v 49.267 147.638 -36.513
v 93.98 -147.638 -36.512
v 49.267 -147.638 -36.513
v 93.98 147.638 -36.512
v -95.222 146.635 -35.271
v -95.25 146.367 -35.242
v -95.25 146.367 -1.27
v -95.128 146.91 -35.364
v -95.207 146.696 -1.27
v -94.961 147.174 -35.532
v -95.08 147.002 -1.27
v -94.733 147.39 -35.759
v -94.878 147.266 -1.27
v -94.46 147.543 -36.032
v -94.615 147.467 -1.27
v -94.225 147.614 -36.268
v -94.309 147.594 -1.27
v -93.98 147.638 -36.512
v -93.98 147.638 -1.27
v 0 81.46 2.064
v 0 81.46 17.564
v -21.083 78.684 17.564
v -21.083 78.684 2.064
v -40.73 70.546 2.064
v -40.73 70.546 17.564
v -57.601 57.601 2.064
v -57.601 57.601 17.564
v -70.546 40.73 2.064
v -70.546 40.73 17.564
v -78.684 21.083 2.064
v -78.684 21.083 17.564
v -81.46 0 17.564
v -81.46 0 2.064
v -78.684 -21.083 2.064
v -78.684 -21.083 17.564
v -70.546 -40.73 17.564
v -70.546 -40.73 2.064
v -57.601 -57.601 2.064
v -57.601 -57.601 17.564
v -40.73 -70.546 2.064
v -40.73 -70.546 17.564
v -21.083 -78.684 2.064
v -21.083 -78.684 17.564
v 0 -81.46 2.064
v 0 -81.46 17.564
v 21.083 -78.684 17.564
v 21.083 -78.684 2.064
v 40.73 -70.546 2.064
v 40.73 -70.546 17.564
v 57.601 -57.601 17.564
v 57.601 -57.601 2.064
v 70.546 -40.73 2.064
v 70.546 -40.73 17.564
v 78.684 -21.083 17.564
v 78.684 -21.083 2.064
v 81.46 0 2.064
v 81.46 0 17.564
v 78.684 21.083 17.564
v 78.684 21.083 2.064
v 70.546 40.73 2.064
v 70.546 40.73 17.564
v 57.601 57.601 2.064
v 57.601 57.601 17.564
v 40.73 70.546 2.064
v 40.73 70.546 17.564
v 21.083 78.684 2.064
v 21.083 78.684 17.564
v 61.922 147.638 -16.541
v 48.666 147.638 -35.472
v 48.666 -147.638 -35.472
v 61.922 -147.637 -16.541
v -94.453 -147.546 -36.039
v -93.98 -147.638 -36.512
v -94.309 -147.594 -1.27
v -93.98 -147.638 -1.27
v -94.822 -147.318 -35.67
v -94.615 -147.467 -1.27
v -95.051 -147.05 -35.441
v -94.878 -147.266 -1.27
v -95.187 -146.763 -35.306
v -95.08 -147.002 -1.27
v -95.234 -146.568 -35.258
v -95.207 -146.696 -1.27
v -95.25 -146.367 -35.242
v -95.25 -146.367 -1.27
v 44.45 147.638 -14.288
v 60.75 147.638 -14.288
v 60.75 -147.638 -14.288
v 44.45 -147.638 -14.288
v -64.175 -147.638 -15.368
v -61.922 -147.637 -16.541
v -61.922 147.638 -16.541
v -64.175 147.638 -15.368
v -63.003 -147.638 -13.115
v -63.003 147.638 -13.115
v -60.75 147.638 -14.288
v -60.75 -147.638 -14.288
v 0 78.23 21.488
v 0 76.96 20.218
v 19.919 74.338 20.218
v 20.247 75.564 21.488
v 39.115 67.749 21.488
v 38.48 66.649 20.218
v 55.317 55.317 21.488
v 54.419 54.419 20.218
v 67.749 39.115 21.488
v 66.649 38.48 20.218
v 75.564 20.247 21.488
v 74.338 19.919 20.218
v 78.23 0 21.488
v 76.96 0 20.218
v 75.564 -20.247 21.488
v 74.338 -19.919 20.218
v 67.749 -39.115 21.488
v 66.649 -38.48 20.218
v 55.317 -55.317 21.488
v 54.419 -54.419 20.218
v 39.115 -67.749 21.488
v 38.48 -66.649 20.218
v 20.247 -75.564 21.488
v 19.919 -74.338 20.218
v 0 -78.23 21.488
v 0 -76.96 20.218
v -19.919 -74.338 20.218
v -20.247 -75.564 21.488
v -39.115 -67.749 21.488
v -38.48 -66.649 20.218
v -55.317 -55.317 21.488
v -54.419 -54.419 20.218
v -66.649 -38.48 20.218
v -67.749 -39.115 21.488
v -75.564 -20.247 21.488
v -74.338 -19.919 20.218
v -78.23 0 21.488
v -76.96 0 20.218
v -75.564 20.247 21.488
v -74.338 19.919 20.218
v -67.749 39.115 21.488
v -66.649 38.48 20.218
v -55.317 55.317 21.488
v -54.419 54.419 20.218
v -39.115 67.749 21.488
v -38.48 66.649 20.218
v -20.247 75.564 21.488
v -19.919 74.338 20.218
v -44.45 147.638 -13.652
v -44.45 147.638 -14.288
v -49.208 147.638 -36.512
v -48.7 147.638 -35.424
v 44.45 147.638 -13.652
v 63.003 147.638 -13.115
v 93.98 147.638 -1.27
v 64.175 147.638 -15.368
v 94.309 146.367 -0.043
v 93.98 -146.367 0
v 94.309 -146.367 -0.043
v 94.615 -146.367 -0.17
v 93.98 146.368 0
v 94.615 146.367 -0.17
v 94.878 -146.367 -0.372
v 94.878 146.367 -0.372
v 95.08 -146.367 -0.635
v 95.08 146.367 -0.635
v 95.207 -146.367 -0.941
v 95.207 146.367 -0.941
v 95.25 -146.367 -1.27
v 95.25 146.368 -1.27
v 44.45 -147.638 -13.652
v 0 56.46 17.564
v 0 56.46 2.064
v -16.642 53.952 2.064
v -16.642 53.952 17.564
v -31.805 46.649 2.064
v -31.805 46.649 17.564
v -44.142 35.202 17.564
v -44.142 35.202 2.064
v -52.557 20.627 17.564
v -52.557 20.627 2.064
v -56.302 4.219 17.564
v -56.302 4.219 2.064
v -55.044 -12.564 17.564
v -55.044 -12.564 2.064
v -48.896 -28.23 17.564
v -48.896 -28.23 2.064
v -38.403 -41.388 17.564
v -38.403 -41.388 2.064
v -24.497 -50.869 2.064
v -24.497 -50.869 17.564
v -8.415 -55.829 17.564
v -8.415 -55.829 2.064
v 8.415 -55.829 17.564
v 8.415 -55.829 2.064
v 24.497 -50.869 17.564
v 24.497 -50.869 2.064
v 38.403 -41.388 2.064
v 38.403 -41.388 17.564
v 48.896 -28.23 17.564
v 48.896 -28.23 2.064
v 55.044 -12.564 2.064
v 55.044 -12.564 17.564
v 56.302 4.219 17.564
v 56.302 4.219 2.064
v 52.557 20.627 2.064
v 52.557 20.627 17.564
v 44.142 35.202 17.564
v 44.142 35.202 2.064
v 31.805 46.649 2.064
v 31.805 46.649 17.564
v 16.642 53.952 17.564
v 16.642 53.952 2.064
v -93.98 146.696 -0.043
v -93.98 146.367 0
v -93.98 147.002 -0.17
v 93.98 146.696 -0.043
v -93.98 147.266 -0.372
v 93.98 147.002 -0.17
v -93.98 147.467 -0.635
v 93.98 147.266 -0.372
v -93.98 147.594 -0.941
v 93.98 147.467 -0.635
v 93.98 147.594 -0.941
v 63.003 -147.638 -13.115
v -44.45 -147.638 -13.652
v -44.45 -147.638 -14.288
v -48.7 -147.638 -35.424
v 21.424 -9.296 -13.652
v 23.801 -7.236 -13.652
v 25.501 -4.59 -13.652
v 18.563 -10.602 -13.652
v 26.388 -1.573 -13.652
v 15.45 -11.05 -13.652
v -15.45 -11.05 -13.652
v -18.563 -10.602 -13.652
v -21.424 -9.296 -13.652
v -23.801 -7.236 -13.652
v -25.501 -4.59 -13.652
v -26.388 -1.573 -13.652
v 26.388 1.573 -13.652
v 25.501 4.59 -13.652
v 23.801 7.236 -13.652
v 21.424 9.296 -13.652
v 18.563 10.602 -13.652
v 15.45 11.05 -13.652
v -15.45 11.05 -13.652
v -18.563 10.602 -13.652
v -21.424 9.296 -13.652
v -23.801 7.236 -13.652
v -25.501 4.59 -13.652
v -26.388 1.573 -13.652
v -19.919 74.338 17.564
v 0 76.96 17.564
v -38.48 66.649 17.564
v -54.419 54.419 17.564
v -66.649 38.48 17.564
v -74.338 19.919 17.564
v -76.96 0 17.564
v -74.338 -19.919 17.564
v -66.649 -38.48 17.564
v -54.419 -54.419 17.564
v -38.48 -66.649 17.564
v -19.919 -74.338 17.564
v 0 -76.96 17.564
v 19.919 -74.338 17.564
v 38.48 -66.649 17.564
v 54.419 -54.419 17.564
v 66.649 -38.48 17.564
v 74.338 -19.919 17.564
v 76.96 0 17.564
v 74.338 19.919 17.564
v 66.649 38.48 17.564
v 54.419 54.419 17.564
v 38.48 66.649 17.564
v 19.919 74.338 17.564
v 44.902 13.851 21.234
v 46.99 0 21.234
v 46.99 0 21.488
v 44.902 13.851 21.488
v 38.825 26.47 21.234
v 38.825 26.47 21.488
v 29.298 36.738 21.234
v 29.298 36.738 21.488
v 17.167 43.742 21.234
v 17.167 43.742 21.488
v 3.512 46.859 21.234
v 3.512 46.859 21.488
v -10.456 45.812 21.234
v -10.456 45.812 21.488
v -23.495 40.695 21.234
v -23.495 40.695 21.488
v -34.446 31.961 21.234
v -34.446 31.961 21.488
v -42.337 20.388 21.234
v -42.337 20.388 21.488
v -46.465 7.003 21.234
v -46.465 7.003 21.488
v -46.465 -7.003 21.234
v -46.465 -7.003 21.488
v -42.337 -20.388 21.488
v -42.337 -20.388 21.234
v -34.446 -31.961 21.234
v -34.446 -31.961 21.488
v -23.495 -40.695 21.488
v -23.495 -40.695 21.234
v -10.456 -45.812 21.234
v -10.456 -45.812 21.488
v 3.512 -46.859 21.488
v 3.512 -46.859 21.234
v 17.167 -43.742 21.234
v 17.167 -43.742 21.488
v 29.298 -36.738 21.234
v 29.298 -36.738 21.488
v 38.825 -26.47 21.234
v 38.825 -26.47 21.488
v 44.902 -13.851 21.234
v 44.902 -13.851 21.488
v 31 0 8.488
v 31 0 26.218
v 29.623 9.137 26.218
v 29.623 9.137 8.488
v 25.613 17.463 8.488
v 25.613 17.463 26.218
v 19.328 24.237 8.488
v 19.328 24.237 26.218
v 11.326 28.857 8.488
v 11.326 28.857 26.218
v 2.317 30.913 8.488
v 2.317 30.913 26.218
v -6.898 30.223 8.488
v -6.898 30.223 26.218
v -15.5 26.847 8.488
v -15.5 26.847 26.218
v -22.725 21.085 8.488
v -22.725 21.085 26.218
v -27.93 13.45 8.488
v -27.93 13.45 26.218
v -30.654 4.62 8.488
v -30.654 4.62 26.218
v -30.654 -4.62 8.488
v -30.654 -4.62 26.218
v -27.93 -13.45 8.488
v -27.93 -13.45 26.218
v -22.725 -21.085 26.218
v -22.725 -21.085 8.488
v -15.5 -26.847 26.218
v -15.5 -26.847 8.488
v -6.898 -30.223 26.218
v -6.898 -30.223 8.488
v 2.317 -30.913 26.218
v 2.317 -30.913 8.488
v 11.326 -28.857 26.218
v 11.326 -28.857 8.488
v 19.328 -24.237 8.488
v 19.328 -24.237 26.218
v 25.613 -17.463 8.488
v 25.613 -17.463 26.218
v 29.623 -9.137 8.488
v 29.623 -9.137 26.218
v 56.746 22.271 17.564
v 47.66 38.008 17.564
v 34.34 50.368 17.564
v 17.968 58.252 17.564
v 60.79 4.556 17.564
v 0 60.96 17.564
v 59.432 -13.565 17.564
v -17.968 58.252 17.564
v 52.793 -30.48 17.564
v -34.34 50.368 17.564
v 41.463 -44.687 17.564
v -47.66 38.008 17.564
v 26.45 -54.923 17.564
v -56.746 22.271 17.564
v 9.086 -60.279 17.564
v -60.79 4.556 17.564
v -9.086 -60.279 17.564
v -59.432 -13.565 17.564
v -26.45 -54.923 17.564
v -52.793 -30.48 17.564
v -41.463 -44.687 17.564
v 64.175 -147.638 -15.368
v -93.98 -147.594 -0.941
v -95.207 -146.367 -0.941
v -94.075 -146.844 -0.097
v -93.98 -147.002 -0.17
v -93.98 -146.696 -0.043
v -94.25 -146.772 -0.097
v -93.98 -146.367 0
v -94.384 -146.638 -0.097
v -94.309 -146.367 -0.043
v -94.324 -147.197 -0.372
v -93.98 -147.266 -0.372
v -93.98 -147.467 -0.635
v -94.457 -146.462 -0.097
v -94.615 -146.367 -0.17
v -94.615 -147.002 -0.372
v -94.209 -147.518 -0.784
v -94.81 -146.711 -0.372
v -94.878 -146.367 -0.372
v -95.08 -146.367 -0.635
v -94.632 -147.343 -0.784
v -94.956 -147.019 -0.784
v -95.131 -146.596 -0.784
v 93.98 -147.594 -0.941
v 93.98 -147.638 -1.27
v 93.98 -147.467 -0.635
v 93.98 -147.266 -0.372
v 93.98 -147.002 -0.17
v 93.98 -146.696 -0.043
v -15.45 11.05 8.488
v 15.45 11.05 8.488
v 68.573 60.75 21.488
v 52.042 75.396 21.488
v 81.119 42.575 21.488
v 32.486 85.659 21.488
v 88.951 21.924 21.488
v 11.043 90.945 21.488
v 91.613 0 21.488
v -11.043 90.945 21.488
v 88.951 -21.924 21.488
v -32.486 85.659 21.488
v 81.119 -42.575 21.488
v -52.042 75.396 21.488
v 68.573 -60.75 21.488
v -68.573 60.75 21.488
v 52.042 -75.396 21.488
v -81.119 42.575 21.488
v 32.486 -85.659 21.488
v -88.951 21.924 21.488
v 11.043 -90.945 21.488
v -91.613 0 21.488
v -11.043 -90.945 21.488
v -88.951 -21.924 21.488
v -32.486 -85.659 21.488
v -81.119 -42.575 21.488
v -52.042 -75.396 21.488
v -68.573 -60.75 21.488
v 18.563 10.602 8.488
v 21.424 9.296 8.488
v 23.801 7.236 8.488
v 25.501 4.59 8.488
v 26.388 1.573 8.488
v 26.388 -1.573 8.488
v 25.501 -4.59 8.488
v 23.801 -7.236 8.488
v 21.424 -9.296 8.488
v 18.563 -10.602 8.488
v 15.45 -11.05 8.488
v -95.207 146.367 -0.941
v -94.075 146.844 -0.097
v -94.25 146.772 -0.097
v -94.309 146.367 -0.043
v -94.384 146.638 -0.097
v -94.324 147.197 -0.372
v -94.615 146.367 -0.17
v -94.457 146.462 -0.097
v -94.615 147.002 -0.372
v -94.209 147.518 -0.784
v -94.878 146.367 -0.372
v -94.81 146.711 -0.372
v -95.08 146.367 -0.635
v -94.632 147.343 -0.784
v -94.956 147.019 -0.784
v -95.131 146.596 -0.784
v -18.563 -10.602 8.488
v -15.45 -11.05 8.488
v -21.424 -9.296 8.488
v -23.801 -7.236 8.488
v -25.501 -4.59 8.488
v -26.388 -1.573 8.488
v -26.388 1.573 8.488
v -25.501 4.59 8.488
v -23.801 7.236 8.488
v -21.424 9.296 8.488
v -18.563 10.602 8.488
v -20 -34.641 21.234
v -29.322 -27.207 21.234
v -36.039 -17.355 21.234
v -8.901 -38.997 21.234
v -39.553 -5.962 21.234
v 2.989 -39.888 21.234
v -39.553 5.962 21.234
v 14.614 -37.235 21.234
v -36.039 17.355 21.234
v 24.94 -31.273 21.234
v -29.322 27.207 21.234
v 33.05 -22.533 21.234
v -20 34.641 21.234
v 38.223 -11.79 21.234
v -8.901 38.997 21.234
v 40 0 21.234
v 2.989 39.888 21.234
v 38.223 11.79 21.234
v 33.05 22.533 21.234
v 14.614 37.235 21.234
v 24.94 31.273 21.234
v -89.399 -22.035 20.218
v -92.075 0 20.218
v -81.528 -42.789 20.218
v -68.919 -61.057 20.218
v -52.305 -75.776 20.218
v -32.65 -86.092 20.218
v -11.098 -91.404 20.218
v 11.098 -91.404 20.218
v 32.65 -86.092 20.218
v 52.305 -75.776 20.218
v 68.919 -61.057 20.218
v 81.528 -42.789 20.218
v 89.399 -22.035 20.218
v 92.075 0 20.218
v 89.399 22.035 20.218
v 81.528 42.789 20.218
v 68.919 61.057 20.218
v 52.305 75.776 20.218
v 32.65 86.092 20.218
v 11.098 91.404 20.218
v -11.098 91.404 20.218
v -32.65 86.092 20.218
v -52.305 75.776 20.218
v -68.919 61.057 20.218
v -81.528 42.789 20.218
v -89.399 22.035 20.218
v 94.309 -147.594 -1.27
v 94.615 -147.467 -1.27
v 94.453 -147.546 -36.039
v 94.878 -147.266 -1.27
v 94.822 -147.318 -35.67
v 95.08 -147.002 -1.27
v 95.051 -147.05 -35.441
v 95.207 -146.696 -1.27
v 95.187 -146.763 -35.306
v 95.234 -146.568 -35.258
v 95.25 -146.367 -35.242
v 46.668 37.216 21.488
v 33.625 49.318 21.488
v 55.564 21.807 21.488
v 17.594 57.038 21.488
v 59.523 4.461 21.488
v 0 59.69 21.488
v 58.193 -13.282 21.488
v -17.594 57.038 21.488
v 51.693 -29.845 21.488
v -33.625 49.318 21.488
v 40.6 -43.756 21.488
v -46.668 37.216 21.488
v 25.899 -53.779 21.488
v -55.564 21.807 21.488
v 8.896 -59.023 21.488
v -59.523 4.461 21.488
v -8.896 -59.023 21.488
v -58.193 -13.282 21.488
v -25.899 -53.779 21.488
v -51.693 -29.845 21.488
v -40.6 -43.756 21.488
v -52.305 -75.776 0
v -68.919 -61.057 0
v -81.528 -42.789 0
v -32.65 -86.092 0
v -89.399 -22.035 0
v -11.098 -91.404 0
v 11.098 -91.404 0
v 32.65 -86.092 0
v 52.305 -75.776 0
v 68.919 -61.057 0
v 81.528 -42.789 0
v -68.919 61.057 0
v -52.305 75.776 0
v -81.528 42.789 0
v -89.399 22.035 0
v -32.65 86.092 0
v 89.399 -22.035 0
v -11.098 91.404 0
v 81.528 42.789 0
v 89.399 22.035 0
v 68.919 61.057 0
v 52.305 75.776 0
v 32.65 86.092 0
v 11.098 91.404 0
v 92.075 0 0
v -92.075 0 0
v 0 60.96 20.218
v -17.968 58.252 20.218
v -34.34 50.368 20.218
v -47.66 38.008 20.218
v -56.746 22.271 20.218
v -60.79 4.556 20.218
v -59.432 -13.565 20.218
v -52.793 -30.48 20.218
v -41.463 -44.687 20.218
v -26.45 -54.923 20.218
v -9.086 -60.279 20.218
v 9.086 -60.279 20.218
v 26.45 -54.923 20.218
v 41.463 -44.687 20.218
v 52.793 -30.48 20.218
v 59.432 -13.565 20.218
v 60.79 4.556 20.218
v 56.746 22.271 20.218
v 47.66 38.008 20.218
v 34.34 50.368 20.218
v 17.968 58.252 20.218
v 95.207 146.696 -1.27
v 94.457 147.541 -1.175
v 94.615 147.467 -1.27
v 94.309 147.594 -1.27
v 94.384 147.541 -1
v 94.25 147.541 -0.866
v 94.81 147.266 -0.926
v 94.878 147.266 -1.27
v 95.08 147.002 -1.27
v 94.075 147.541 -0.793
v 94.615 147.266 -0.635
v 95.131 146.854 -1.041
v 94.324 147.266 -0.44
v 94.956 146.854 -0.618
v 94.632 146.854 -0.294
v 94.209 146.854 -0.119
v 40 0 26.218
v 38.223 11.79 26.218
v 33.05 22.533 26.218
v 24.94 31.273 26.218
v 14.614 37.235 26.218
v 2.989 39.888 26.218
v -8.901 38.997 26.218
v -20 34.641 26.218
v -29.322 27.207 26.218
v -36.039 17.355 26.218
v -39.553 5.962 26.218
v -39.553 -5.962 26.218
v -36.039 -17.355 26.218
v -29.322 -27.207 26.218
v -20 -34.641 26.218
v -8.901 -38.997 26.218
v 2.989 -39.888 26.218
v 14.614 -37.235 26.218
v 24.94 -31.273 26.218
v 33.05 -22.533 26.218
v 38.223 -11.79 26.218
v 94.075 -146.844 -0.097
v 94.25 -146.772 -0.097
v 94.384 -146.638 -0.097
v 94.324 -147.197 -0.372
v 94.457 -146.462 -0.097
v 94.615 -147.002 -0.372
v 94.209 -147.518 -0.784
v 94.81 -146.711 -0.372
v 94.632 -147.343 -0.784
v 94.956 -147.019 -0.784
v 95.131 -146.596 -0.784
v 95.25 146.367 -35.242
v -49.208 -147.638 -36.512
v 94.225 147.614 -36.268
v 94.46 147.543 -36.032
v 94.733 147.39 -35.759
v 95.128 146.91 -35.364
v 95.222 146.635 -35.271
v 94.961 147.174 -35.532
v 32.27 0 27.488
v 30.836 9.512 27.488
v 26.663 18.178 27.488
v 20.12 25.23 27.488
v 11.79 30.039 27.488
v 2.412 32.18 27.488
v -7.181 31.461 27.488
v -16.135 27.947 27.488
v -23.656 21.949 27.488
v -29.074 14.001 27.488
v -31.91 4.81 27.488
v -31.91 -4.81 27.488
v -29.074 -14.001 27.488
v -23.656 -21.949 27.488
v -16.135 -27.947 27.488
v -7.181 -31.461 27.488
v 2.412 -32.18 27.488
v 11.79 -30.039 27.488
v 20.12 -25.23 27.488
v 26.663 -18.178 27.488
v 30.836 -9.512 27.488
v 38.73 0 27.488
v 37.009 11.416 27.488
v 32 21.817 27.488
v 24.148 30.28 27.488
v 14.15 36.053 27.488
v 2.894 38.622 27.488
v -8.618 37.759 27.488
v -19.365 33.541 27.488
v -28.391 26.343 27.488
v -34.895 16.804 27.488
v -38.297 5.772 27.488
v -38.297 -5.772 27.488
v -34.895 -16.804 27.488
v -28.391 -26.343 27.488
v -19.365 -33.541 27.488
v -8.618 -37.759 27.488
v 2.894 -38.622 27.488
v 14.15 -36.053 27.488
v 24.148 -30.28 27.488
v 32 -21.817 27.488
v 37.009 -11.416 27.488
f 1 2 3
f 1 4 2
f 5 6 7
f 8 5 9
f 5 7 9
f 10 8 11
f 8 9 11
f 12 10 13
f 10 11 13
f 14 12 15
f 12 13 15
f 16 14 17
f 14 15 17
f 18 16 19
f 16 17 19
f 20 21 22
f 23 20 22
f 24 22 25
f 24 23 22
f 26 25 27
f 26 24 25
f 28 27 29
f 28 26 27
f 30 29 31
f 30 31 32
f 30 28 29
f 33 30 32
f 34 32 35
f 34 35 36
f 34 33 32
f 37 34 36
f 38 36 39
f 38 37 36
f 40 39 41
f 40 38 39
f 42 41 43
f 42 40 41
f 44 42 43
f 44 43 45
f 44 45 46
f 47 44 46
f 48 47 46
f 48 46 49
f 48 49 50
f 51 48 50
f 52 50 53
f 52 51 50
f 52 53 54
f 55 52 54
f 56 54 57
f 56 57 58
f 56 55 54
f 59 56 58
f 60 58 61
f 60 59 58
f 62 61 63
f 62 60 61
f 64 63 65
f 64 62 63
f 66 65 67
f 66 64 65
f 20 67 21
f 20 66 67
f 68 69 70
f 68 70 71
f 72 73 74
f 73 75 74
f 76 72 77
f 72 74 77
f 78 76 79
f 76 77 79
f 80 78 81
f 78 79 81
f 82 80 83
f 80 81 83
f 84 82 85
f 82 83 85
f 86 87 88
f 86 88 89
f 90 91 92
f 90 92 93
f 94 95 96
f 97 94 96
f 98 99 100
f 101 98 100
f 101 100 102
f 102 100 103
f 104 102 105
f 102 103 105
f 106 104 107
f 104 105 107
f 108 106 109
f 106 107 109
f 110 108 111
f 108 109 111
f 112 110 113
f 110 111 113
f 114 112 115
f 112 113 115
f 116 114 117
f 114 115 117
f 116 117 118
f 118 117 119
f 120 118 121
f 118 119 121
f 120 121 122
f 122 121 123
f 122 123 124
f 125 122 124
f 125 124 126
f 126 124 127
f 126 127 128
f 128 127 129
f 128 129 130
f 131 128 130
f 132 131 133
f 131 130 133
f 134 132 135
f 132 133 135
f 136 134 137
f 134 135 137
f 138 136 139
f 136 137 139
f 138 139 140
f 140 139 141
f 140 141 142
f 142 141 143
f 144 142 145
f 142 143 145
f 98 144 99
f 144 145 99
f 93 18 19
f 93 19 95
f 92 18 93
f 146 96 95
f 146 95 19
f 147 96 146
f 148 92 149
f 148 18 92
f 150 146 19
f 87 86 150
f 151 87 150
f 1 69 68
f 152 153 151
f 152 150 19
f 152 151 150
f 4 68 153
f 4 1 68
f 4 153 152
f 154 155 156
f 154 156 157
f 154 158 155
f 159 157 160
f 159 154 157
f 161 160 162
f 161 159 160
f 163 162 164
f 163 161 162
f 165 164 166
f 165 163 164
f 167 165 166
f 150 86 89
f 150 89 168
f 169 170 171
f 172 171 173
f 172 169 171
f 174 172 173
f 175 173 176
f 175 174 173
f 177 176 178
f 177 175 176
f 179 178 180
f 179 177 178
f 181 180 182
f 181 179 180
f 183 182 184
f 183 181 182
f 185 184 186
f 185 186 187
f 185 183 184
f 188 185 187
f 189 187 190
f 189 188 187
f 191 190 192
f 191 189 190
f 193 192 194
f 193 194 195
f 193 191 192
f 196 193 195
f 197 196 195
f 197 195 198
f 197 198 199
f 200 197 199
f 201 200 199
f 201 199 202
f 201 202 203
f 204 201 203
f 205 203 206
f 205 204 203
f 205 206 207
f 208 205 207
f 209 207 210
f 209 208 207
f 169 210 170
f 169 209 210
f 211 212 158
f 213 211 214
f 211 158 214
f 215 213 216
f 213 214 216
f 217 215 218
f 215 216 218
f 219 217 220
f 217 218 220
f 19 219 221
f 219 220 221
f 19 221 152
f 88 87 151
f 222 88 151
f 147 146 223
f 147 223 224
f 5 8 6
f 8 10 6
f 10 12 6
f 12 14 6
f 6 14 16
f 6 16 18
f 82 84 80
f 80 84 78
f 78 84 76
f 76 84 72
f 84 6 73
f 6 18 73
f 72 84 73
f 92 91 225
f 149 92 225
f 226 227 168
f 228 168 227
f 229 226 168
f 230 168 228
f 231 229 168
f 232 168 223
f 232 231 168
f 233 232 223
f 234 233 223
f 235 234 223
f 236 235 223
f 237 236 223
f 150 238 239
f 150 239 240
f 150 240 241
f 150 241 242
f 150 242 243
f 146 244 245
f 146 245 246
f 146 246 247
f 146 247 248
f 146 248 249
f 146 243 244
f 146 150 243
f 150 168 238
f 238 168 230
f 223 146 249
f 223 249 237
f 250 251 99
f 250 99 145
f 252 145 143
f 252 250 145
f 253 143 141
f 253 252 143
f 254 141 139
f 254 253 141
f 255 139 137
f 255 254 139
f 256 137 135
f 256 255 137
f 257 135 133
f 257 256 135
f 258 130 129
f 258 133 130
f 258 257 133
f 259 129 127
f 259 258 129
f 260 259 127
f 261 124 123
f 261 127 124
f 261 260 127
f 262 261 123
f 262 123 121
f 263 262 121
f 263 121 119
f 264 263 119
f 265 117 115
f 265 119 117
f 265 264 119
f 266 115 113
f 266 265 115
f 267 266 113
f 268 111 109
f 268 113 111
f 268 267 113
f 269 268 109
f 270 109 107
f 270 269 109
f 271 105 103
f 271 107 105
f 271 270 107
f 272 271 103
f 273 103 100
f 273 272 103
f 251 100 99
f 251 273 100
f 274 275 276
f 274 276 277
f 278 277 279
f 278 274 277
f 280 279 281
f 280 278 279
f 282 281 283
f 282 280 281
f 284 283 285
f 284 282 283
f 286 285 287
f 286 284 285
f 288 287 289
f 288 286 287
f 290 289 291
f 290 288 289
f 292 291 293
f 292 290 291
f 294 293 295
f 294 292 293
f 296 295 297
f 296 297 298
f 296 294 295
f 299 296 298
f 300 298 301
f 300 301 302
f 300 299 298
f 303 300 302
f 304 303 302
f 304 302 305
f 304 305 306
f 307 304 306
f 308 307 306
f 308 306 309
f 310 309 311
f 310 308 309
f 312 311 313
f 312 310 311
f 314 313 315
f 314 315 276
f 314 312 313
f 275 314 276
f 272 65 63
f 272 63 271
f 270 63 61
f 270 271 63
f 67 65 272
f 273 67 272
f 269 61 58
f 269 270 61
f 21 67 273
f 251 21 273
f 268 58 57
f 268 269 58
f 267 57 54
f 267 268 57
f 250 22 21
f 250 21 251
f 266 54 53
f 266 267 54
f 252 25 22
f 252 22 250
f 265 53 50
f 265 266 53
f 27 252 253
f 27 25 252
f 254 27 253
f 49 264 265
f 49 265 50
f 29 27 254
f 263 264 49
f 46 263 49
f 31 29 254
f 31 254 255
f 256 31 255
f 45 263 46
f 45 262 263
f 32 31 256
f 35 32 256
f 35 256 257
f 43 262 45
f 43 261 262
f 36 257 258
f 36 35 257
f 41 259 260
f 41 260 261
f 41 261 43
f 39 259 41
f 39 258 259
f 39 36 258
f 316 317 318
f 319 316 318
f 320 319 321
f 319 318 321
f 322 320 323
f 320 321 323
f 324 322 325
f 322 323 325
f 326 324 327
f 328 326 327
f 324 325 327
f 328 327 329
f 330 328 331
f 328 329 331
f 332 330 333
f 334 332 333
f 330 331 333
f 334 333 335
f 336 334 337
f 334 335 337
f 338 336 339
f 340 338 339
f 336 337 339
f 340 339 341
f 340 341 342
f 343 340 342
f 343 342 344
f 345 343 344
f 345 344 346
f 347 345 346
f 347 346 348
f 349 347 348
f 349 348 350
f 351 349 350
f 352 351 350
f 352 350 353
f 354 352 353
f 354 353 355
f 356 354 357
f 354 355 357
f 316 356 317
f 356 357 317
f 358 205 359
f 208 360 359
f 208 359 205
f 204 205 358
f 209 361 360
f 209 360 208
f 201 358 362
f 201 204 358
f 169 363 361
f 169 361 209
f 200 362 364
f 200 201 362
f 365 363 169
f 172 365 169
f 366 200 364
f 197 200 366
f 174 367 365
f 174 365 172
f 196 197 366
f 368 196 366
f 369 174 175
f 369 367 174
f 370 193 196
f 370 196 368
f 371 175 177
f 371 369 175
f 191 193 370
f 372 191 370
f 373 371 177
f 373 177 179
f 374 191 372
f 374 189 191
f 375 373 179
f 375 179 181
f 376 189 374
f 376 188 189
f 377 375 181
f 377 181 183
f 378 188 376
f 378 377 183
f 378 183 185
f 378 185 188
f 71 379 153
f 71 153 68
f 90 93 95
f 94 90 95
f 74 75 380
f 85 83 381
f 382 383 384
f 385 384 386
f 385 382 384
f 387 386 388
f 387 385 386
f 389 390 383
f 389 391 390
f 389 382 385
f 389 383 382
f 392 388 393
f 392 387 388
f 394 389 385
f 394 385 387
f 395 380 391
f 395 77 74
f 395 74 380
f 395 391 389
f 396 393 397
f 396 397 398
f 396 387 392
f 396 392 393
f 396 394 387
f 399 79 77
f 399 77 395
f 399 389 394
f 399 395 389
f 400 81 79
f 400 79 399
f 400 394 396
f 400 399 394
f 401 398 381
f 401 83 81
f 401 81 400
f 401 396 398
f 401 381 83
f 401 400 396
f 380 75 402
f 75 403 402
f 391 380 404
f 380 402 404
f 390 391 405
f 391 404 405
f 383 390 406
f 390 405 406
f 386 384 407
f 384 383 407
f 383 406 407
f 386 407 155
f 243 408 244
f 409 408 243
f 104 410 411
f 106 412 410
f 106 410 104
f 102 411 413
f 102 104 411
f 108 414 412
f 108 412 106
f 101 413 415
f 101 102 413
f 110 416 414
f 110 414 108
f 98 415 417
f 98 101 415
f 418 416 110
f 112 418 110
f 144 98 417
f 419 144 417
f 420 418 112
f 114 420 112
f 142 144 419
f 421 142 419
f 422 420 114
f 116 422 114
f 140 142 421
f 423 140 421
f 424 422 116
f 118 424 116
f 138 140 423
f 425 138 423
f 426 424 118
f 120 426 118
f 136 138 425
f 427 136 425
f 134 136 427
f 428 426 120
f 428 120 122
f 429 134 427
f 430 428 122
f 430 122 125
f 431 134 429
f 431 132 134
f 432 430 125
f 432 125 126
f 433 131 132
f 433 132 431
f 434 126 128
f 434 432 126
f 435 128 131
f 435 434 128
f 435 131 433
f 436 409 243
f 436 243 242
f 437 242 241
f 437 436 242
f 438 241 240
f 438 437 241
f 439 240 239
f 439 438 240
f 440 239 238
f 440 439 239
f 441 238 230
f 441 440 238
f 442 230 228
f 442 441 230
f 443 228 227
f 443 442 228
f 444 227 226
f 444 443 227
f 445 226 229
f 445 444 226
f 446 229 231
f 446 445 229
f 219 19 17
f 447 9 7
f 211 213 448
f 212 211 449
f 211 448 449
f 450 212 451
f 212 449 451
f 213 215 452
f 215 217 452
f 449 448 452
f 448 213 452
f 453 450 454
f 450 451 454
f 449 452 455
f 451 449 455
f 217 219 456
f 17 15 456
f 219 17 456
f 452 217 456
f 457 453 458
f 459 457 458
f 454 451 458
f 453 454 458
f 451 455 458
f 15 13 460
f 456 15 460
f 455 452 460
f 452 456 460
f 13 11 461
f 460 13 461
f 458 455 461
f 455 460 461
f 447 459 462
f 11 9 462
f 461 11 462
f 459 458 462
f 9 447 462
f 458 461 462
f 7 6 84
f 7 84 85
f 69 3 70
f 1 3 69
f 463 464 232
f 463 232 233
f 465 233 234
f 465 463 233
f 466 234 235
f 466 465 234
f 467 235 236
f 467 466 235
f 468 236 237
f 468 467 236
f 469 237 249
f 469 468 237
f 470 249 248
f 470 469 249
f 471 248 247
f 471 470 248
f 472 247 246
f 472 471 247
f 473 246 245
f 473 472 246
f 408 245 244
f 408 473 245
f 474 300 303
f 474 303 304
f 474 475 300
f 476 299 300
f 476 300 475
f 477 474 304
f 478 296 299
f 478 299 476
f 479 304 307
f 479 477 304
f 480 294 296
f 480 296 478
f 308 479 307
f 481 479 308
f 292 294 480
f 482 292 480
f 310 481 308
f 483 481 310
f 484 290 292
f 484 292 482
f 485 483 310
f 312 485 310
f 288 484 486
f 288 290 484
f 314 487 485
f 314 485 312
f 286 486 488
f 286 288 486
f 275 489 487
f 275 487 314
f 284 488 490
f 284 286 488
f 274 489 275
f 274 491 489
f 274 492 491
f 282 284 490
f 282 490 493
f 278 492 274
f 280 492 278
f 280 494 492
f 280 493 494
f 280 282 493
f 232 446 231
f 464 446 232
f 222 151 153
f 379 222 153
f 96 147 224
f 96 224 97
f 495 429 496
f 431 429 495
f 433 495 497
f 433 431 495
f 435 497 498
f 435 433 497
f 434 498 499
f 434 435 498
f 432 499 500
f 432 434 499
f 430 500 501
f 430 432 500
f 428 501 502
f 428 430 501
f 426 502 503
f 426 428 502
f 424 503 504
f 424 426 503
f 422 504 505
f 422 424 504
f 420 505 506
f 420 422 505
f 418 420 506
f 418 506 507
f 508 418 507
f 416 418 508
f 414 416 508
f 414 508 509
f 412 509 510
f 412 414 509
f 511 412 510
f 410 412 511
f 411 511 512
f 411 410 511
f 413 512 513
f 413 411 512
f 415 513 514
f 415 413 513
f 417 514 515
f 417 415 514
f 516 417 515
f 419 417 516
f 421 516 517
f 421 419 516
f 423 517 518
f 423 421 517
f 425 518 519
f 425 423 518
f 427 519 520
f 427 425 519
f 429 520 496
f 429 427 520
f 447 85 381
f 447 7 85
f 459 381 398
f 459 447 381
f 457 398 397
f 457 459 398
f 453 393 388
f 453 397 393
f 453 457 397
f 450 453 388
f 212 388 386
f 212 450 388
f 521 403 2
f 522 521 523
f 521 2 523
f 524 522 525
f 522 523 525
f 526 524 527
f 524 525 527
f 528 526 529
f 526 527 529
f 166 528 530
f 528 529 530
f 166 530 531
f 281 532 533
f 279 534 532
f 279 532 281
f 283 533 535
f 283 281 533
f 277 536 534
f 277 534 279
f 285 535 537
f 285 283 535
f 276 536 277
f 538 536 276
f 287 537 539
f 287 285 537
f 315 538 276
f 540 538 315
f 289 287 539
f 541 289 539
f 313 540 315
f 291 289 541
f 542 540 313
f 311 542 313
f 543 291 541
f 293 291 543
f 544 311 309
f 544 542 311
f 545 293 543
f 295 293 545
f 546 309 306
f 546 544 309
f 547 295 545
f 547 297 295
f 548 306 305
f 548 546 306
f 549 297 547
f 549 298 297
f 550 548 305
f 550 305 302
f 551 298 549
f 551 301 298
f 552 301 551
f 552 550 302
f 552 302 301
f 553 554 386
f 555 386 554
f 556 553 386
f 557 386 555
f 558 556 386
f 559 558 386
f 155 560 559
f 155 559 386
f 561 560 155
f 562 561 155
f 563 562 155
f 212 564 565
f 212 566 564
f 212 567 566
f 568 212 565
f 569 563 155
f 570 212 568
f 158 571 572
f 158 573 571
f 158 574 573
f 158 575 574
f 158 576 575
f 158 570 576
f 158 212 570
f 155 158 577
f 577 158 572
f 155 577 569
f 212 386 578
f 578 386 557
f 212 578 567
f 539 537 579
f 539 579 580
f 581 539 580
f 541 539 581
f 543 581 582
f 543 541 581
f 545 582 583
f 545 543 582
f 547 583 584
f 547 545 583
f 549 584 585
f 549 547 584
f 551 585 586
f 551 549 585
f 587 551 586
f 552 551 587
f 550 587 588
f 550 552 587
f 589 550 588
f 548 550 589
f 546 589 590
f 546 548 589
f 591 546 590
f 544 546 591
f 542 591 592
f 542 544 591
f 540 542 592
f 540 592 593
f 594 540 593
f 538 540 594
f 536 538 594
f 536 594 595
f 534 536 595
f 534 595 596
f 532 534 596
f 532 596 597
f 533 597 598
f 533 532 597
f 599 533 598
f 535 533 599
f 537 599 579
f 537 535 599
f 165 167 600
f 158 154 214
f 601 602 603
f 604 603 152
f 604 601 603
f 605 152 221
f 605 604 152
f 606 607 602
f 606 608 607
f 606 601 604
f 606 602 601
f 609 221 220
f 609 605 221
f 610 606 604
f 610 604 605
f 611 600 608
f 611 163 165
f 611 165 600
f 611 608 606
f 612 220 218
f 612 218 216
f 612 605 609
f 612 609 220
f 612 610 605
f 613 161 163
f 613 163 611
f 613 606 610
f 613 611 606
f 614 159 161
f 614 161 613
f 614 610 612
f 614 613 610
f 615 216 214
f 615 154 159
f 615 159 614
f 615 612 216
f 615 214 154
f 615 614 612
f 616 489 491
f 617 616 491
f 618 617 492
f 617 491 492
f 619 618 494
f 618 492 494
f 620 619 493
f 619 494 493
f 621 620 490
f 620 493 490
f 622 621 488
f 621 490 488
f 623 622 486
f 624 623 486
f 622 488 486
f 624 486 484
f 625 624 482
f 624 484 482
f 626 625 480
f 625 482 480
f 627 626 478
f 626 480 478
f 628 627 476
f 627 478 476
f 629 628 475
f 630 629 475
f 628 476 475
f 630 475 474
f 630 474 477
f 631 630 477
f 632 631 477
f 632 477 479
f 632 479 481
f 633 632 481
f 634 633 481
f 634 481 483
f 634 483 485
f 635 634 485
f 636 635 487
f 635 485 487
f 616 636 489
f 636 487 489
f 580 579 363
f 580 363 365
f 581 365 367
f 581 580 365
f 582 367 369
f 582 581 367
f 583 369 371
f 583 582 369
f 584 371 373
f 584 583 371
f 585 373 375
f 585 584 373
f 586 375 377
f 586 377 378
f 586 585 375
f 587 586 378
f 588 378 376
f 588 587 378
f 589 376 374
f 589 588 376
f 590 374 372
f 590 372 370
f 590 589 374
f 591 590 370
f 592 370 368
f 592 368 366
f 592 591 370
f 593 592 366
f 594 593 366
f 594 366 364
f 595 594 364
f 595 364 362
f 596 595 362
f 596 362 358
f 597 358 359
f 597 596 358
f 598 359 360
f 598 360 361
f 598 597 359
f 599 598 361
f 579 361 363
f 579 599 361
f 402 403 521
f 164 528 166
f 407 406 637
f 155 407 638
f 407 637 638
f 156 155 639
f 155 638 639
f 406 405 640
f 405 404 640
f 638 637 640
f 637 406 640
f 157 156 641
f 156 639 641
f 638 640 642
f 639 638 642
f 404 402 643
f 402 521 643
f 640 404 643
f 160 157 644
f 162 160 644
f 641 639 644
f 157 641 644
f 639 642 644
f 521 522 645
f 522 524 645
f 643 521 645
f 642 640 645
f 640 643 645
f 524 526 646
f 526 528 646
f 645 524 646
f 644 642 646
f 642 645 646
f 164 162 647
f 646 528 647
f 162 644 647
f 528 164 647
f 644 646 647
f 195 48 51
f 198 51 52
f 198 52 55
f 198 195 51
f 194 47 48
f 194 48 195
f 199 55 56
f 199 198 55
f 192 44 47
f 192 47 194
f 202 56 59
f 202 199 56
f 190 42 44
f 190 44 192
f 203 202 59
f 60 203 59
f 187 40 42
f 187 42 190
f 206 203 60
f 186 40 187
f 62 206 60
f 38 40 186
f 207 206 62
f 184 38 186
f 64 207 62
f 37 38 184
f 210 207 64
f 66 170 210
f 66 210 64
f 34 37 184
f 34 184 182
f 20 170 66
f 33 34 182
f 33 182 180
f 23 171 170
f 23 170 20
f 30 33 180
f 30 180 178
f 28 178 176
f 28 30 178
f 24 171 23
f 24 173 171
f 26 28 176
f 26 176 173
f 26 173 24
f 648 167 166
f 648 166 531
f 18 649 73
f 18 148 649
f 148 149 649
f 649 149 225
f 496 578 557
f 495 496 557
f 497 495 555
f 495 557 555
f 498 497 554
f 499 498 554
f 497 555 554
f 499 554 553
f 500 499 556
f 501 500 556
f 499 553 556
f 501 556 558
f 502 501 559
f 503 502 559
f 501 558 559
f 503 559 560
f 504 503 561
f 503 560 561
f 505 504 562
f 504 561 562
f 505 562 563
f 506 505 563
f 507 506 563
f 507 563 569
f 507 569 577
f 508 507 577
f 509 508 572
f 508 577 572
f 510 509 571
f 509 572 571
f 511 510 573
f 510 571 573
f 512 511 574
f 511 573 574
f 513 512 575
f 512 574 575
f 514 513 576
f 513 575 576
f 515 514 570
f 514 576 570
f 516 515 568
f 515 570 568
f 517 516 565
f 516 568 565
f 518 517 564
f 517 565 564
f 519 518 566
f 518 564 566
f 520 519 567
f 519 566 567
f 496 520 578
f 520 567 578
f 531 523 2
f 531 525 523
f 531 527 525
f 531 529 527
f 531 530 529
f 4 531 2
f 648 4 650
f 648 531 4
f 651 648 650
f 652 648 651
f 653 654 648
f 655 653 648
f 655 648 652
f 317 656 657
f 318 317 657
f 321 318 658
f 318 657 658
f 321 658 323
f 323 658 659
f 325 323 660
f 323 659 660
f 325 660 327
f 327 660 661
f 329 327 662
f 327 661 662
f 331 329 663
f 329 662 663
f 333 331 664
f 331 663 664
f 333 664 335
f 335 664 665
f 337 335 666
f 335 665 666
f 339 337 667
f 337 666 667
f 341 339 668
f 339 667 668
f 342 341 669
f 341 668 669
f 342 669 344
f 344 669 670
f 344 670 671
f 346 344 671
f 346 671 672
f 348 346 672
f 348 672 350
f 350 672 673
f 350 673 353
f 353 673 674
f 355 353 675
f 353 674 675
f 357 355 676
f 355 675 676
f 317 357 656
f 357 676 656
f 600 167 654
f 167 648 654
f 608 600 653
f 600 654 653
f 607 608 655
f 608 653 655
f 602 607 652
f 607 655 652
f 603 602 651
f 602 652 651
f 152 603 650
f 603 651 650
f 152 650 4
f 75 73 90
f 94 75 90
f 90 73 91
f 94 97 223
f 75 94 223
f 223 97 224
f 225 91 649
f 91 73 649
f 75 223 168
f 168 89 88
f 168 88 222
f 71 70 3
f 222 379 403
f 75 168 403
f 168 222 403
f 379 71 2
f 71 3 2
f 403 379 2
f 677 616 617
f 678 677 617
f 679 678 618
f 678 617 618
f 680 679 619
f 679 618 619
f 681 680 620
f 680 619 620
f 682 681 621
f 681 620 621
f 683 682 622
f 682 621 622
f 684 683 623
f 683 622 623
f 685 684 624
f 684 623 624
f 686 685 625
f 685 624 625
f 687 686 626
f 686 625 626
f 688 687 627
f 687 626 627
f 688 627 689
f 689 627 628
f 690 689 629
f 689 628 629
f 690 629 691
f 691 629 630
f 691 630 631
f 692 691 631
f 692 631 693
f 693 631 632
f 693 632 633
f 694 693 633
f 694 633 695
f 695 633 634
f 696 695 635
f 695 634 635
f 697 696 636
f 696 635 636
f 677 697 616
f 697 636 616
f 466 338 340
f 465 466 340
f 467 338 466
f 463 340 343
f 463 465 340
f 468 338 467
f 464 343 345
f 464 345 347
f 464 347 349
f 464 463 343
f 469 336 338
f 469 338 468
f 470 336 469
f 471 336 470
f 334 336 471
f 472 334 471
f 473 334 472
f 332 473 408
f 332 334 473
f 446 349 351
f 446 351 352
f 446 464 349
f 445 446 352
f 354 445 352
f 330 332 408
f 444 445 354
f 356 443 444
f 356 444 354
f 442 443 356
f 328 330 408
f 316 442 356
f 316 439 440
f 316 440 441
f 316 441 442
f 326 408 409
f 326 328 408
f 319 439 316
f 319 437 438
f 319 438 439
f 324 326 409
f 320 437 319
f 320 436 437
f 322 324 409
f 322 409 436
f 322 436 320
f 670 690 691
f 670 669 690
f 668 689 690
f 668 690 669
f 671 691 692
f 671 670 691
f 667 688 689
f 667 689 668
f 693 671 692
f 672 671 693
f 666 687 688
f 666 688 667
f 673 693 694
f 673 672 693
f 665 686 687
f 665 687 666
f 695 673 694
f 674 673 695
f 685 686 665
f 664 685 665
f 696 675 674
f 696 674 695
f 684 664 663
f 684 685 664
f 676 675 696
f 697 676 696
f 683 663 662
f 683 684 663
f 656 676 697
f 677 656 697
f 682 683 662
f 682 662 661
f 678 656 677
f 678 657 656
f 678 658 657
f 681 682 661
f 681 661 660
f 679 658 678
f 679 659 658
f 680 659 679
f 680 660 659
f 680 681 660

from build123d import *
from OCP.BRepFilletAPI import BRepFilletAPI_MakeChamfer

# Parameters (mm, degrees)
BOSS_EXTRUDE1_DEPTH = 147.6375
CUT_EXTRUDE1_DEPTH  = 313.398864885
SKETCH2_R           = 92.075
BOSS_EXTRUDE2_DEPTH = 21.4875
SKETCH5_R           = 40
BOSS_EXTRUDE3_DEPTH = 6
CUT_EXTRUDE4_START  = -0.254
SKETCH8_R           = 46.99
SKETCH8_R_2         = 40
CUT_EXTRUDE4_DEPTH  = 0.254
SKETCH6_R           = 31
CUT_EXTRUDE2_DEPTH  = 19
CUT_EXTRUDE3_DEPTH  = 38.1
CHAMFER3_SIZE       = 1.27
CHAMFER1_SIZE       = 1.27
CHAMFER1_SIZE2      = 1.329072894
FILLET1_R           = 1.27
CHAMFER2_SIZE       = 1.27
CHAMFER2_SIZE2      = 0.462242198
CHAMFER4_SIZE       = 1.27


with BuildPart() as part:
    # Sketch1 → Boss-Extrude1 (new, symmetric)
    with BuildSketch(Plane(origin=(0, 0, 0), x_dir=(1, 0, 0), z_dir=(0, 1, 0))):
        Polygon((-95.25, 36.5125), (-95.25, 0), (95.25, 0), (95.25, 36.5125), (47.937887463, 36.5125), (63.5, 14.2875), (44.45, 14.2875), (44.45, 13.6525), (-44.45, 13.6525), (-44.45, 14.2875), (-63.5, 14.2875), (-47.937887463, 36.5125), align=None)
    extrude(amount=BOSS_EXTRUDE1_DEPTH, both=True)

    # Sketch3 → Cut-Extrude1 (cut, through all)
    with BuildSketch(Plane(origin=(0, 147.6375, 0), x_dir=(1, 0, 0), z_dir=(0, 1, 0))):
        Polygon((-61.922427153, 16.540507516), (-64.17543467, 15.367666039), (-63.002593192, 13.114658522), (-60.749585676, 14.2875), align=None)
        Polygon((64.17543467, 15.367666039), (61.922427153, 16.540507516), (60.749585676, 14.2875), (63.002593192, 13.114658522), align=None)
    extrude(amount=-CUT_EXTRUDE1_DEPTH, mode=Mode.SUBTRACT)

    # Sketch2 → Boss-Extrude2 (add)
    with BuildSketch(Plane.XY):
        with Locations(Location((0, 0, 0), (0, 0, 180))):
            Circle(SKETCH2_R)
    extrude(amount=BOSS_EXTRUDE2_DEPTH)

    # Sketch4 → Cut-Revolve1 (revolve, cut)
    with BuildSketch(Plane(origin=(0, 0, 0), x_dir=(0, 0, -1), z_dir=(1, 0, 0))):
        Polygon((-28.064444951, 76.96), (-17.564444869, 76.96), (-17.564444869, 81.46), (-2.064444951, 81.46), (-2.064444951, 56.46), (-17.564444869, 56.46), (-17.564444869, 60.96), (-28.064444951, 60.96), align=None)
    revolve(axis=Axis((0, 0, 0), (0, 0, 1)), mode=Mode.SUBTRACT)

    # Sketch5 → Boss-Extrude3 (add)
    with BuildSketch(Plane.XY.offset(21.4875)):
        Circle(SKETCH5_R)
    extrude(amount=BOSS_EXTRUDE3_DEPTH)

    # Sketch8 → Cut-Extrude4 (cut)
    with BuildSketch(Plane.XY.offset(21.4875).offset(CUT_EXTRUDE4_START)):
        Circle(SKETCH8_R)
        Circle(SKETCH8_R_2, mode=Mode.SUBTRACT)
    extrude(amount=CUT_EXTRUDE4_DEPTH, mode=Mode.SUBTRACT)

    # Sketch6 → Cut-Extrude2 (cut)
    with BuildSketch(Plane.XY.offset(27.4875)):
        Circle(SKETCH6_R)
    extrude(amount=-CUT_EXTRUDE2_DEPTH, mode=Mode.SUBTRACT)

    # Sketch7 → Cut-Extrude3 (cut)
    with BuildSketch(Plane.XY.offset(8.4875)):
        with BuildLine():
            Line((15.45, -11.05), (-15.45, -11.05))
            ThreePointArc((-15.45, -11.05), (-26.5, 0), (-15.45, 11.05))
            Line((-15.45, 11.05), (15.45, 11.05))
            ThreePointArc((15.45, 11.05), (26.5, 0), (15.45, -11.05))
        make_face()
    extrude(amount=-CUT_EXTRUDE3_DEPTH, mode=Mode.SUBTRACT)

    # Chamfer3
    chamfer3_edges = [part.edges().sort_by_distance(p)[0] for p in [
        (95.25, 0, -36.5125),
        (-95.25, 0, -36.5125),
    ]]
    chamfer(chamfer3_edges, length=CHAMFER3_SIZE)

    # Chamfer1: one chamfer whose edges measure the first distance from different faces: ONE call of the kernel's chamfer builder (chamfer() names one face for all edges)
    chamfer1_edges_1 = [part.edges().sort_by_distance(p)[0] for p in [
        (47.937887463, 0, -36.5125),
    ]]
    chamfer1_side_1 = [part.faces().sort_by_distance(p)[0] for p in [
        (54.930157308, 0, -26.526503758),
    ]]
    chamfer1_edges_2 = [part.edges().sort_by_distance(p)[0] for p in [
        (-47.937887463, 0, -36.5125),
    ]]
    chamfer1_side_2 = [part.faces().sort_by_distance(p)[0] for p in [
        (-70.958943732, 0, -36.5125),
    ]]
    chamfer1 = BRepFilletAPI_MakeChamfer(part.part.solid().wrapped)
    for e in chamfer1_edges_1:
        chamfer1.Add(CHAMFER1_SIZE, CHAMFER1_SIZE2, e.wrapped, chamfer1_side_1[0].wrapped)  # the first distance lies on this face
    for e in chamfer1_edges_2:
        chamfer1.Add(CHAMFER1_SIZE, CHAMFER1_SIZE2, e.wrapped, chamfer1_side_2[0].wrapped)  # the first distance lies on this face
    add(Compound.cast(chamfer1.Shape()), mode=Mode.REPLACE)

    # Fillet1
    fillet1_edges = [part.edges().sort_by_distance(p)[0] for p in [
        (95.25, -147.6375, -17.62125),
        (-95.25, -147.6375, -17.62125),
        (0, -147.6375, 0),
        (95.25, 0, 0),
        (95.25, 147.6375, -17.62125),
        (-95.25, 147.6375, -17.62125),
        (0, 147.6375, 0),
        (-95.25, 0, 0),
    ]]
    fillet(fillet1_edges, radius=FILLET1_R)

    # Chamfer2
    chamfer2_edges = [part.edges().sort_by_distance(p)[0] for p in [
        (92.075, 0, 21.4875),
    ]]
    chamfer2_side = [part.faces().sort_by_distance(p)[0] for p in [
        (92.075, 0, 10.74375),
    ]]
    chamfer(chamfer2_edges, length=CHAMFER2_SIZE, length2=CHAMFER2_SIZE2, reference=chamfer2_side[0])

    # Chamfer4
    chamfer4_edges = [part.edges().sort_by_distance(p)[0] for p in [
        (0, -76.96, 21.4875),
        (0, -60.96, 21.4875),
        (-40, 0, 27.4875),
        (-31, 0, 27.4875),
    ]]
    chamfer(chamfer4_edges, length=CHAMFER4_SIZE)


solid = part.part
